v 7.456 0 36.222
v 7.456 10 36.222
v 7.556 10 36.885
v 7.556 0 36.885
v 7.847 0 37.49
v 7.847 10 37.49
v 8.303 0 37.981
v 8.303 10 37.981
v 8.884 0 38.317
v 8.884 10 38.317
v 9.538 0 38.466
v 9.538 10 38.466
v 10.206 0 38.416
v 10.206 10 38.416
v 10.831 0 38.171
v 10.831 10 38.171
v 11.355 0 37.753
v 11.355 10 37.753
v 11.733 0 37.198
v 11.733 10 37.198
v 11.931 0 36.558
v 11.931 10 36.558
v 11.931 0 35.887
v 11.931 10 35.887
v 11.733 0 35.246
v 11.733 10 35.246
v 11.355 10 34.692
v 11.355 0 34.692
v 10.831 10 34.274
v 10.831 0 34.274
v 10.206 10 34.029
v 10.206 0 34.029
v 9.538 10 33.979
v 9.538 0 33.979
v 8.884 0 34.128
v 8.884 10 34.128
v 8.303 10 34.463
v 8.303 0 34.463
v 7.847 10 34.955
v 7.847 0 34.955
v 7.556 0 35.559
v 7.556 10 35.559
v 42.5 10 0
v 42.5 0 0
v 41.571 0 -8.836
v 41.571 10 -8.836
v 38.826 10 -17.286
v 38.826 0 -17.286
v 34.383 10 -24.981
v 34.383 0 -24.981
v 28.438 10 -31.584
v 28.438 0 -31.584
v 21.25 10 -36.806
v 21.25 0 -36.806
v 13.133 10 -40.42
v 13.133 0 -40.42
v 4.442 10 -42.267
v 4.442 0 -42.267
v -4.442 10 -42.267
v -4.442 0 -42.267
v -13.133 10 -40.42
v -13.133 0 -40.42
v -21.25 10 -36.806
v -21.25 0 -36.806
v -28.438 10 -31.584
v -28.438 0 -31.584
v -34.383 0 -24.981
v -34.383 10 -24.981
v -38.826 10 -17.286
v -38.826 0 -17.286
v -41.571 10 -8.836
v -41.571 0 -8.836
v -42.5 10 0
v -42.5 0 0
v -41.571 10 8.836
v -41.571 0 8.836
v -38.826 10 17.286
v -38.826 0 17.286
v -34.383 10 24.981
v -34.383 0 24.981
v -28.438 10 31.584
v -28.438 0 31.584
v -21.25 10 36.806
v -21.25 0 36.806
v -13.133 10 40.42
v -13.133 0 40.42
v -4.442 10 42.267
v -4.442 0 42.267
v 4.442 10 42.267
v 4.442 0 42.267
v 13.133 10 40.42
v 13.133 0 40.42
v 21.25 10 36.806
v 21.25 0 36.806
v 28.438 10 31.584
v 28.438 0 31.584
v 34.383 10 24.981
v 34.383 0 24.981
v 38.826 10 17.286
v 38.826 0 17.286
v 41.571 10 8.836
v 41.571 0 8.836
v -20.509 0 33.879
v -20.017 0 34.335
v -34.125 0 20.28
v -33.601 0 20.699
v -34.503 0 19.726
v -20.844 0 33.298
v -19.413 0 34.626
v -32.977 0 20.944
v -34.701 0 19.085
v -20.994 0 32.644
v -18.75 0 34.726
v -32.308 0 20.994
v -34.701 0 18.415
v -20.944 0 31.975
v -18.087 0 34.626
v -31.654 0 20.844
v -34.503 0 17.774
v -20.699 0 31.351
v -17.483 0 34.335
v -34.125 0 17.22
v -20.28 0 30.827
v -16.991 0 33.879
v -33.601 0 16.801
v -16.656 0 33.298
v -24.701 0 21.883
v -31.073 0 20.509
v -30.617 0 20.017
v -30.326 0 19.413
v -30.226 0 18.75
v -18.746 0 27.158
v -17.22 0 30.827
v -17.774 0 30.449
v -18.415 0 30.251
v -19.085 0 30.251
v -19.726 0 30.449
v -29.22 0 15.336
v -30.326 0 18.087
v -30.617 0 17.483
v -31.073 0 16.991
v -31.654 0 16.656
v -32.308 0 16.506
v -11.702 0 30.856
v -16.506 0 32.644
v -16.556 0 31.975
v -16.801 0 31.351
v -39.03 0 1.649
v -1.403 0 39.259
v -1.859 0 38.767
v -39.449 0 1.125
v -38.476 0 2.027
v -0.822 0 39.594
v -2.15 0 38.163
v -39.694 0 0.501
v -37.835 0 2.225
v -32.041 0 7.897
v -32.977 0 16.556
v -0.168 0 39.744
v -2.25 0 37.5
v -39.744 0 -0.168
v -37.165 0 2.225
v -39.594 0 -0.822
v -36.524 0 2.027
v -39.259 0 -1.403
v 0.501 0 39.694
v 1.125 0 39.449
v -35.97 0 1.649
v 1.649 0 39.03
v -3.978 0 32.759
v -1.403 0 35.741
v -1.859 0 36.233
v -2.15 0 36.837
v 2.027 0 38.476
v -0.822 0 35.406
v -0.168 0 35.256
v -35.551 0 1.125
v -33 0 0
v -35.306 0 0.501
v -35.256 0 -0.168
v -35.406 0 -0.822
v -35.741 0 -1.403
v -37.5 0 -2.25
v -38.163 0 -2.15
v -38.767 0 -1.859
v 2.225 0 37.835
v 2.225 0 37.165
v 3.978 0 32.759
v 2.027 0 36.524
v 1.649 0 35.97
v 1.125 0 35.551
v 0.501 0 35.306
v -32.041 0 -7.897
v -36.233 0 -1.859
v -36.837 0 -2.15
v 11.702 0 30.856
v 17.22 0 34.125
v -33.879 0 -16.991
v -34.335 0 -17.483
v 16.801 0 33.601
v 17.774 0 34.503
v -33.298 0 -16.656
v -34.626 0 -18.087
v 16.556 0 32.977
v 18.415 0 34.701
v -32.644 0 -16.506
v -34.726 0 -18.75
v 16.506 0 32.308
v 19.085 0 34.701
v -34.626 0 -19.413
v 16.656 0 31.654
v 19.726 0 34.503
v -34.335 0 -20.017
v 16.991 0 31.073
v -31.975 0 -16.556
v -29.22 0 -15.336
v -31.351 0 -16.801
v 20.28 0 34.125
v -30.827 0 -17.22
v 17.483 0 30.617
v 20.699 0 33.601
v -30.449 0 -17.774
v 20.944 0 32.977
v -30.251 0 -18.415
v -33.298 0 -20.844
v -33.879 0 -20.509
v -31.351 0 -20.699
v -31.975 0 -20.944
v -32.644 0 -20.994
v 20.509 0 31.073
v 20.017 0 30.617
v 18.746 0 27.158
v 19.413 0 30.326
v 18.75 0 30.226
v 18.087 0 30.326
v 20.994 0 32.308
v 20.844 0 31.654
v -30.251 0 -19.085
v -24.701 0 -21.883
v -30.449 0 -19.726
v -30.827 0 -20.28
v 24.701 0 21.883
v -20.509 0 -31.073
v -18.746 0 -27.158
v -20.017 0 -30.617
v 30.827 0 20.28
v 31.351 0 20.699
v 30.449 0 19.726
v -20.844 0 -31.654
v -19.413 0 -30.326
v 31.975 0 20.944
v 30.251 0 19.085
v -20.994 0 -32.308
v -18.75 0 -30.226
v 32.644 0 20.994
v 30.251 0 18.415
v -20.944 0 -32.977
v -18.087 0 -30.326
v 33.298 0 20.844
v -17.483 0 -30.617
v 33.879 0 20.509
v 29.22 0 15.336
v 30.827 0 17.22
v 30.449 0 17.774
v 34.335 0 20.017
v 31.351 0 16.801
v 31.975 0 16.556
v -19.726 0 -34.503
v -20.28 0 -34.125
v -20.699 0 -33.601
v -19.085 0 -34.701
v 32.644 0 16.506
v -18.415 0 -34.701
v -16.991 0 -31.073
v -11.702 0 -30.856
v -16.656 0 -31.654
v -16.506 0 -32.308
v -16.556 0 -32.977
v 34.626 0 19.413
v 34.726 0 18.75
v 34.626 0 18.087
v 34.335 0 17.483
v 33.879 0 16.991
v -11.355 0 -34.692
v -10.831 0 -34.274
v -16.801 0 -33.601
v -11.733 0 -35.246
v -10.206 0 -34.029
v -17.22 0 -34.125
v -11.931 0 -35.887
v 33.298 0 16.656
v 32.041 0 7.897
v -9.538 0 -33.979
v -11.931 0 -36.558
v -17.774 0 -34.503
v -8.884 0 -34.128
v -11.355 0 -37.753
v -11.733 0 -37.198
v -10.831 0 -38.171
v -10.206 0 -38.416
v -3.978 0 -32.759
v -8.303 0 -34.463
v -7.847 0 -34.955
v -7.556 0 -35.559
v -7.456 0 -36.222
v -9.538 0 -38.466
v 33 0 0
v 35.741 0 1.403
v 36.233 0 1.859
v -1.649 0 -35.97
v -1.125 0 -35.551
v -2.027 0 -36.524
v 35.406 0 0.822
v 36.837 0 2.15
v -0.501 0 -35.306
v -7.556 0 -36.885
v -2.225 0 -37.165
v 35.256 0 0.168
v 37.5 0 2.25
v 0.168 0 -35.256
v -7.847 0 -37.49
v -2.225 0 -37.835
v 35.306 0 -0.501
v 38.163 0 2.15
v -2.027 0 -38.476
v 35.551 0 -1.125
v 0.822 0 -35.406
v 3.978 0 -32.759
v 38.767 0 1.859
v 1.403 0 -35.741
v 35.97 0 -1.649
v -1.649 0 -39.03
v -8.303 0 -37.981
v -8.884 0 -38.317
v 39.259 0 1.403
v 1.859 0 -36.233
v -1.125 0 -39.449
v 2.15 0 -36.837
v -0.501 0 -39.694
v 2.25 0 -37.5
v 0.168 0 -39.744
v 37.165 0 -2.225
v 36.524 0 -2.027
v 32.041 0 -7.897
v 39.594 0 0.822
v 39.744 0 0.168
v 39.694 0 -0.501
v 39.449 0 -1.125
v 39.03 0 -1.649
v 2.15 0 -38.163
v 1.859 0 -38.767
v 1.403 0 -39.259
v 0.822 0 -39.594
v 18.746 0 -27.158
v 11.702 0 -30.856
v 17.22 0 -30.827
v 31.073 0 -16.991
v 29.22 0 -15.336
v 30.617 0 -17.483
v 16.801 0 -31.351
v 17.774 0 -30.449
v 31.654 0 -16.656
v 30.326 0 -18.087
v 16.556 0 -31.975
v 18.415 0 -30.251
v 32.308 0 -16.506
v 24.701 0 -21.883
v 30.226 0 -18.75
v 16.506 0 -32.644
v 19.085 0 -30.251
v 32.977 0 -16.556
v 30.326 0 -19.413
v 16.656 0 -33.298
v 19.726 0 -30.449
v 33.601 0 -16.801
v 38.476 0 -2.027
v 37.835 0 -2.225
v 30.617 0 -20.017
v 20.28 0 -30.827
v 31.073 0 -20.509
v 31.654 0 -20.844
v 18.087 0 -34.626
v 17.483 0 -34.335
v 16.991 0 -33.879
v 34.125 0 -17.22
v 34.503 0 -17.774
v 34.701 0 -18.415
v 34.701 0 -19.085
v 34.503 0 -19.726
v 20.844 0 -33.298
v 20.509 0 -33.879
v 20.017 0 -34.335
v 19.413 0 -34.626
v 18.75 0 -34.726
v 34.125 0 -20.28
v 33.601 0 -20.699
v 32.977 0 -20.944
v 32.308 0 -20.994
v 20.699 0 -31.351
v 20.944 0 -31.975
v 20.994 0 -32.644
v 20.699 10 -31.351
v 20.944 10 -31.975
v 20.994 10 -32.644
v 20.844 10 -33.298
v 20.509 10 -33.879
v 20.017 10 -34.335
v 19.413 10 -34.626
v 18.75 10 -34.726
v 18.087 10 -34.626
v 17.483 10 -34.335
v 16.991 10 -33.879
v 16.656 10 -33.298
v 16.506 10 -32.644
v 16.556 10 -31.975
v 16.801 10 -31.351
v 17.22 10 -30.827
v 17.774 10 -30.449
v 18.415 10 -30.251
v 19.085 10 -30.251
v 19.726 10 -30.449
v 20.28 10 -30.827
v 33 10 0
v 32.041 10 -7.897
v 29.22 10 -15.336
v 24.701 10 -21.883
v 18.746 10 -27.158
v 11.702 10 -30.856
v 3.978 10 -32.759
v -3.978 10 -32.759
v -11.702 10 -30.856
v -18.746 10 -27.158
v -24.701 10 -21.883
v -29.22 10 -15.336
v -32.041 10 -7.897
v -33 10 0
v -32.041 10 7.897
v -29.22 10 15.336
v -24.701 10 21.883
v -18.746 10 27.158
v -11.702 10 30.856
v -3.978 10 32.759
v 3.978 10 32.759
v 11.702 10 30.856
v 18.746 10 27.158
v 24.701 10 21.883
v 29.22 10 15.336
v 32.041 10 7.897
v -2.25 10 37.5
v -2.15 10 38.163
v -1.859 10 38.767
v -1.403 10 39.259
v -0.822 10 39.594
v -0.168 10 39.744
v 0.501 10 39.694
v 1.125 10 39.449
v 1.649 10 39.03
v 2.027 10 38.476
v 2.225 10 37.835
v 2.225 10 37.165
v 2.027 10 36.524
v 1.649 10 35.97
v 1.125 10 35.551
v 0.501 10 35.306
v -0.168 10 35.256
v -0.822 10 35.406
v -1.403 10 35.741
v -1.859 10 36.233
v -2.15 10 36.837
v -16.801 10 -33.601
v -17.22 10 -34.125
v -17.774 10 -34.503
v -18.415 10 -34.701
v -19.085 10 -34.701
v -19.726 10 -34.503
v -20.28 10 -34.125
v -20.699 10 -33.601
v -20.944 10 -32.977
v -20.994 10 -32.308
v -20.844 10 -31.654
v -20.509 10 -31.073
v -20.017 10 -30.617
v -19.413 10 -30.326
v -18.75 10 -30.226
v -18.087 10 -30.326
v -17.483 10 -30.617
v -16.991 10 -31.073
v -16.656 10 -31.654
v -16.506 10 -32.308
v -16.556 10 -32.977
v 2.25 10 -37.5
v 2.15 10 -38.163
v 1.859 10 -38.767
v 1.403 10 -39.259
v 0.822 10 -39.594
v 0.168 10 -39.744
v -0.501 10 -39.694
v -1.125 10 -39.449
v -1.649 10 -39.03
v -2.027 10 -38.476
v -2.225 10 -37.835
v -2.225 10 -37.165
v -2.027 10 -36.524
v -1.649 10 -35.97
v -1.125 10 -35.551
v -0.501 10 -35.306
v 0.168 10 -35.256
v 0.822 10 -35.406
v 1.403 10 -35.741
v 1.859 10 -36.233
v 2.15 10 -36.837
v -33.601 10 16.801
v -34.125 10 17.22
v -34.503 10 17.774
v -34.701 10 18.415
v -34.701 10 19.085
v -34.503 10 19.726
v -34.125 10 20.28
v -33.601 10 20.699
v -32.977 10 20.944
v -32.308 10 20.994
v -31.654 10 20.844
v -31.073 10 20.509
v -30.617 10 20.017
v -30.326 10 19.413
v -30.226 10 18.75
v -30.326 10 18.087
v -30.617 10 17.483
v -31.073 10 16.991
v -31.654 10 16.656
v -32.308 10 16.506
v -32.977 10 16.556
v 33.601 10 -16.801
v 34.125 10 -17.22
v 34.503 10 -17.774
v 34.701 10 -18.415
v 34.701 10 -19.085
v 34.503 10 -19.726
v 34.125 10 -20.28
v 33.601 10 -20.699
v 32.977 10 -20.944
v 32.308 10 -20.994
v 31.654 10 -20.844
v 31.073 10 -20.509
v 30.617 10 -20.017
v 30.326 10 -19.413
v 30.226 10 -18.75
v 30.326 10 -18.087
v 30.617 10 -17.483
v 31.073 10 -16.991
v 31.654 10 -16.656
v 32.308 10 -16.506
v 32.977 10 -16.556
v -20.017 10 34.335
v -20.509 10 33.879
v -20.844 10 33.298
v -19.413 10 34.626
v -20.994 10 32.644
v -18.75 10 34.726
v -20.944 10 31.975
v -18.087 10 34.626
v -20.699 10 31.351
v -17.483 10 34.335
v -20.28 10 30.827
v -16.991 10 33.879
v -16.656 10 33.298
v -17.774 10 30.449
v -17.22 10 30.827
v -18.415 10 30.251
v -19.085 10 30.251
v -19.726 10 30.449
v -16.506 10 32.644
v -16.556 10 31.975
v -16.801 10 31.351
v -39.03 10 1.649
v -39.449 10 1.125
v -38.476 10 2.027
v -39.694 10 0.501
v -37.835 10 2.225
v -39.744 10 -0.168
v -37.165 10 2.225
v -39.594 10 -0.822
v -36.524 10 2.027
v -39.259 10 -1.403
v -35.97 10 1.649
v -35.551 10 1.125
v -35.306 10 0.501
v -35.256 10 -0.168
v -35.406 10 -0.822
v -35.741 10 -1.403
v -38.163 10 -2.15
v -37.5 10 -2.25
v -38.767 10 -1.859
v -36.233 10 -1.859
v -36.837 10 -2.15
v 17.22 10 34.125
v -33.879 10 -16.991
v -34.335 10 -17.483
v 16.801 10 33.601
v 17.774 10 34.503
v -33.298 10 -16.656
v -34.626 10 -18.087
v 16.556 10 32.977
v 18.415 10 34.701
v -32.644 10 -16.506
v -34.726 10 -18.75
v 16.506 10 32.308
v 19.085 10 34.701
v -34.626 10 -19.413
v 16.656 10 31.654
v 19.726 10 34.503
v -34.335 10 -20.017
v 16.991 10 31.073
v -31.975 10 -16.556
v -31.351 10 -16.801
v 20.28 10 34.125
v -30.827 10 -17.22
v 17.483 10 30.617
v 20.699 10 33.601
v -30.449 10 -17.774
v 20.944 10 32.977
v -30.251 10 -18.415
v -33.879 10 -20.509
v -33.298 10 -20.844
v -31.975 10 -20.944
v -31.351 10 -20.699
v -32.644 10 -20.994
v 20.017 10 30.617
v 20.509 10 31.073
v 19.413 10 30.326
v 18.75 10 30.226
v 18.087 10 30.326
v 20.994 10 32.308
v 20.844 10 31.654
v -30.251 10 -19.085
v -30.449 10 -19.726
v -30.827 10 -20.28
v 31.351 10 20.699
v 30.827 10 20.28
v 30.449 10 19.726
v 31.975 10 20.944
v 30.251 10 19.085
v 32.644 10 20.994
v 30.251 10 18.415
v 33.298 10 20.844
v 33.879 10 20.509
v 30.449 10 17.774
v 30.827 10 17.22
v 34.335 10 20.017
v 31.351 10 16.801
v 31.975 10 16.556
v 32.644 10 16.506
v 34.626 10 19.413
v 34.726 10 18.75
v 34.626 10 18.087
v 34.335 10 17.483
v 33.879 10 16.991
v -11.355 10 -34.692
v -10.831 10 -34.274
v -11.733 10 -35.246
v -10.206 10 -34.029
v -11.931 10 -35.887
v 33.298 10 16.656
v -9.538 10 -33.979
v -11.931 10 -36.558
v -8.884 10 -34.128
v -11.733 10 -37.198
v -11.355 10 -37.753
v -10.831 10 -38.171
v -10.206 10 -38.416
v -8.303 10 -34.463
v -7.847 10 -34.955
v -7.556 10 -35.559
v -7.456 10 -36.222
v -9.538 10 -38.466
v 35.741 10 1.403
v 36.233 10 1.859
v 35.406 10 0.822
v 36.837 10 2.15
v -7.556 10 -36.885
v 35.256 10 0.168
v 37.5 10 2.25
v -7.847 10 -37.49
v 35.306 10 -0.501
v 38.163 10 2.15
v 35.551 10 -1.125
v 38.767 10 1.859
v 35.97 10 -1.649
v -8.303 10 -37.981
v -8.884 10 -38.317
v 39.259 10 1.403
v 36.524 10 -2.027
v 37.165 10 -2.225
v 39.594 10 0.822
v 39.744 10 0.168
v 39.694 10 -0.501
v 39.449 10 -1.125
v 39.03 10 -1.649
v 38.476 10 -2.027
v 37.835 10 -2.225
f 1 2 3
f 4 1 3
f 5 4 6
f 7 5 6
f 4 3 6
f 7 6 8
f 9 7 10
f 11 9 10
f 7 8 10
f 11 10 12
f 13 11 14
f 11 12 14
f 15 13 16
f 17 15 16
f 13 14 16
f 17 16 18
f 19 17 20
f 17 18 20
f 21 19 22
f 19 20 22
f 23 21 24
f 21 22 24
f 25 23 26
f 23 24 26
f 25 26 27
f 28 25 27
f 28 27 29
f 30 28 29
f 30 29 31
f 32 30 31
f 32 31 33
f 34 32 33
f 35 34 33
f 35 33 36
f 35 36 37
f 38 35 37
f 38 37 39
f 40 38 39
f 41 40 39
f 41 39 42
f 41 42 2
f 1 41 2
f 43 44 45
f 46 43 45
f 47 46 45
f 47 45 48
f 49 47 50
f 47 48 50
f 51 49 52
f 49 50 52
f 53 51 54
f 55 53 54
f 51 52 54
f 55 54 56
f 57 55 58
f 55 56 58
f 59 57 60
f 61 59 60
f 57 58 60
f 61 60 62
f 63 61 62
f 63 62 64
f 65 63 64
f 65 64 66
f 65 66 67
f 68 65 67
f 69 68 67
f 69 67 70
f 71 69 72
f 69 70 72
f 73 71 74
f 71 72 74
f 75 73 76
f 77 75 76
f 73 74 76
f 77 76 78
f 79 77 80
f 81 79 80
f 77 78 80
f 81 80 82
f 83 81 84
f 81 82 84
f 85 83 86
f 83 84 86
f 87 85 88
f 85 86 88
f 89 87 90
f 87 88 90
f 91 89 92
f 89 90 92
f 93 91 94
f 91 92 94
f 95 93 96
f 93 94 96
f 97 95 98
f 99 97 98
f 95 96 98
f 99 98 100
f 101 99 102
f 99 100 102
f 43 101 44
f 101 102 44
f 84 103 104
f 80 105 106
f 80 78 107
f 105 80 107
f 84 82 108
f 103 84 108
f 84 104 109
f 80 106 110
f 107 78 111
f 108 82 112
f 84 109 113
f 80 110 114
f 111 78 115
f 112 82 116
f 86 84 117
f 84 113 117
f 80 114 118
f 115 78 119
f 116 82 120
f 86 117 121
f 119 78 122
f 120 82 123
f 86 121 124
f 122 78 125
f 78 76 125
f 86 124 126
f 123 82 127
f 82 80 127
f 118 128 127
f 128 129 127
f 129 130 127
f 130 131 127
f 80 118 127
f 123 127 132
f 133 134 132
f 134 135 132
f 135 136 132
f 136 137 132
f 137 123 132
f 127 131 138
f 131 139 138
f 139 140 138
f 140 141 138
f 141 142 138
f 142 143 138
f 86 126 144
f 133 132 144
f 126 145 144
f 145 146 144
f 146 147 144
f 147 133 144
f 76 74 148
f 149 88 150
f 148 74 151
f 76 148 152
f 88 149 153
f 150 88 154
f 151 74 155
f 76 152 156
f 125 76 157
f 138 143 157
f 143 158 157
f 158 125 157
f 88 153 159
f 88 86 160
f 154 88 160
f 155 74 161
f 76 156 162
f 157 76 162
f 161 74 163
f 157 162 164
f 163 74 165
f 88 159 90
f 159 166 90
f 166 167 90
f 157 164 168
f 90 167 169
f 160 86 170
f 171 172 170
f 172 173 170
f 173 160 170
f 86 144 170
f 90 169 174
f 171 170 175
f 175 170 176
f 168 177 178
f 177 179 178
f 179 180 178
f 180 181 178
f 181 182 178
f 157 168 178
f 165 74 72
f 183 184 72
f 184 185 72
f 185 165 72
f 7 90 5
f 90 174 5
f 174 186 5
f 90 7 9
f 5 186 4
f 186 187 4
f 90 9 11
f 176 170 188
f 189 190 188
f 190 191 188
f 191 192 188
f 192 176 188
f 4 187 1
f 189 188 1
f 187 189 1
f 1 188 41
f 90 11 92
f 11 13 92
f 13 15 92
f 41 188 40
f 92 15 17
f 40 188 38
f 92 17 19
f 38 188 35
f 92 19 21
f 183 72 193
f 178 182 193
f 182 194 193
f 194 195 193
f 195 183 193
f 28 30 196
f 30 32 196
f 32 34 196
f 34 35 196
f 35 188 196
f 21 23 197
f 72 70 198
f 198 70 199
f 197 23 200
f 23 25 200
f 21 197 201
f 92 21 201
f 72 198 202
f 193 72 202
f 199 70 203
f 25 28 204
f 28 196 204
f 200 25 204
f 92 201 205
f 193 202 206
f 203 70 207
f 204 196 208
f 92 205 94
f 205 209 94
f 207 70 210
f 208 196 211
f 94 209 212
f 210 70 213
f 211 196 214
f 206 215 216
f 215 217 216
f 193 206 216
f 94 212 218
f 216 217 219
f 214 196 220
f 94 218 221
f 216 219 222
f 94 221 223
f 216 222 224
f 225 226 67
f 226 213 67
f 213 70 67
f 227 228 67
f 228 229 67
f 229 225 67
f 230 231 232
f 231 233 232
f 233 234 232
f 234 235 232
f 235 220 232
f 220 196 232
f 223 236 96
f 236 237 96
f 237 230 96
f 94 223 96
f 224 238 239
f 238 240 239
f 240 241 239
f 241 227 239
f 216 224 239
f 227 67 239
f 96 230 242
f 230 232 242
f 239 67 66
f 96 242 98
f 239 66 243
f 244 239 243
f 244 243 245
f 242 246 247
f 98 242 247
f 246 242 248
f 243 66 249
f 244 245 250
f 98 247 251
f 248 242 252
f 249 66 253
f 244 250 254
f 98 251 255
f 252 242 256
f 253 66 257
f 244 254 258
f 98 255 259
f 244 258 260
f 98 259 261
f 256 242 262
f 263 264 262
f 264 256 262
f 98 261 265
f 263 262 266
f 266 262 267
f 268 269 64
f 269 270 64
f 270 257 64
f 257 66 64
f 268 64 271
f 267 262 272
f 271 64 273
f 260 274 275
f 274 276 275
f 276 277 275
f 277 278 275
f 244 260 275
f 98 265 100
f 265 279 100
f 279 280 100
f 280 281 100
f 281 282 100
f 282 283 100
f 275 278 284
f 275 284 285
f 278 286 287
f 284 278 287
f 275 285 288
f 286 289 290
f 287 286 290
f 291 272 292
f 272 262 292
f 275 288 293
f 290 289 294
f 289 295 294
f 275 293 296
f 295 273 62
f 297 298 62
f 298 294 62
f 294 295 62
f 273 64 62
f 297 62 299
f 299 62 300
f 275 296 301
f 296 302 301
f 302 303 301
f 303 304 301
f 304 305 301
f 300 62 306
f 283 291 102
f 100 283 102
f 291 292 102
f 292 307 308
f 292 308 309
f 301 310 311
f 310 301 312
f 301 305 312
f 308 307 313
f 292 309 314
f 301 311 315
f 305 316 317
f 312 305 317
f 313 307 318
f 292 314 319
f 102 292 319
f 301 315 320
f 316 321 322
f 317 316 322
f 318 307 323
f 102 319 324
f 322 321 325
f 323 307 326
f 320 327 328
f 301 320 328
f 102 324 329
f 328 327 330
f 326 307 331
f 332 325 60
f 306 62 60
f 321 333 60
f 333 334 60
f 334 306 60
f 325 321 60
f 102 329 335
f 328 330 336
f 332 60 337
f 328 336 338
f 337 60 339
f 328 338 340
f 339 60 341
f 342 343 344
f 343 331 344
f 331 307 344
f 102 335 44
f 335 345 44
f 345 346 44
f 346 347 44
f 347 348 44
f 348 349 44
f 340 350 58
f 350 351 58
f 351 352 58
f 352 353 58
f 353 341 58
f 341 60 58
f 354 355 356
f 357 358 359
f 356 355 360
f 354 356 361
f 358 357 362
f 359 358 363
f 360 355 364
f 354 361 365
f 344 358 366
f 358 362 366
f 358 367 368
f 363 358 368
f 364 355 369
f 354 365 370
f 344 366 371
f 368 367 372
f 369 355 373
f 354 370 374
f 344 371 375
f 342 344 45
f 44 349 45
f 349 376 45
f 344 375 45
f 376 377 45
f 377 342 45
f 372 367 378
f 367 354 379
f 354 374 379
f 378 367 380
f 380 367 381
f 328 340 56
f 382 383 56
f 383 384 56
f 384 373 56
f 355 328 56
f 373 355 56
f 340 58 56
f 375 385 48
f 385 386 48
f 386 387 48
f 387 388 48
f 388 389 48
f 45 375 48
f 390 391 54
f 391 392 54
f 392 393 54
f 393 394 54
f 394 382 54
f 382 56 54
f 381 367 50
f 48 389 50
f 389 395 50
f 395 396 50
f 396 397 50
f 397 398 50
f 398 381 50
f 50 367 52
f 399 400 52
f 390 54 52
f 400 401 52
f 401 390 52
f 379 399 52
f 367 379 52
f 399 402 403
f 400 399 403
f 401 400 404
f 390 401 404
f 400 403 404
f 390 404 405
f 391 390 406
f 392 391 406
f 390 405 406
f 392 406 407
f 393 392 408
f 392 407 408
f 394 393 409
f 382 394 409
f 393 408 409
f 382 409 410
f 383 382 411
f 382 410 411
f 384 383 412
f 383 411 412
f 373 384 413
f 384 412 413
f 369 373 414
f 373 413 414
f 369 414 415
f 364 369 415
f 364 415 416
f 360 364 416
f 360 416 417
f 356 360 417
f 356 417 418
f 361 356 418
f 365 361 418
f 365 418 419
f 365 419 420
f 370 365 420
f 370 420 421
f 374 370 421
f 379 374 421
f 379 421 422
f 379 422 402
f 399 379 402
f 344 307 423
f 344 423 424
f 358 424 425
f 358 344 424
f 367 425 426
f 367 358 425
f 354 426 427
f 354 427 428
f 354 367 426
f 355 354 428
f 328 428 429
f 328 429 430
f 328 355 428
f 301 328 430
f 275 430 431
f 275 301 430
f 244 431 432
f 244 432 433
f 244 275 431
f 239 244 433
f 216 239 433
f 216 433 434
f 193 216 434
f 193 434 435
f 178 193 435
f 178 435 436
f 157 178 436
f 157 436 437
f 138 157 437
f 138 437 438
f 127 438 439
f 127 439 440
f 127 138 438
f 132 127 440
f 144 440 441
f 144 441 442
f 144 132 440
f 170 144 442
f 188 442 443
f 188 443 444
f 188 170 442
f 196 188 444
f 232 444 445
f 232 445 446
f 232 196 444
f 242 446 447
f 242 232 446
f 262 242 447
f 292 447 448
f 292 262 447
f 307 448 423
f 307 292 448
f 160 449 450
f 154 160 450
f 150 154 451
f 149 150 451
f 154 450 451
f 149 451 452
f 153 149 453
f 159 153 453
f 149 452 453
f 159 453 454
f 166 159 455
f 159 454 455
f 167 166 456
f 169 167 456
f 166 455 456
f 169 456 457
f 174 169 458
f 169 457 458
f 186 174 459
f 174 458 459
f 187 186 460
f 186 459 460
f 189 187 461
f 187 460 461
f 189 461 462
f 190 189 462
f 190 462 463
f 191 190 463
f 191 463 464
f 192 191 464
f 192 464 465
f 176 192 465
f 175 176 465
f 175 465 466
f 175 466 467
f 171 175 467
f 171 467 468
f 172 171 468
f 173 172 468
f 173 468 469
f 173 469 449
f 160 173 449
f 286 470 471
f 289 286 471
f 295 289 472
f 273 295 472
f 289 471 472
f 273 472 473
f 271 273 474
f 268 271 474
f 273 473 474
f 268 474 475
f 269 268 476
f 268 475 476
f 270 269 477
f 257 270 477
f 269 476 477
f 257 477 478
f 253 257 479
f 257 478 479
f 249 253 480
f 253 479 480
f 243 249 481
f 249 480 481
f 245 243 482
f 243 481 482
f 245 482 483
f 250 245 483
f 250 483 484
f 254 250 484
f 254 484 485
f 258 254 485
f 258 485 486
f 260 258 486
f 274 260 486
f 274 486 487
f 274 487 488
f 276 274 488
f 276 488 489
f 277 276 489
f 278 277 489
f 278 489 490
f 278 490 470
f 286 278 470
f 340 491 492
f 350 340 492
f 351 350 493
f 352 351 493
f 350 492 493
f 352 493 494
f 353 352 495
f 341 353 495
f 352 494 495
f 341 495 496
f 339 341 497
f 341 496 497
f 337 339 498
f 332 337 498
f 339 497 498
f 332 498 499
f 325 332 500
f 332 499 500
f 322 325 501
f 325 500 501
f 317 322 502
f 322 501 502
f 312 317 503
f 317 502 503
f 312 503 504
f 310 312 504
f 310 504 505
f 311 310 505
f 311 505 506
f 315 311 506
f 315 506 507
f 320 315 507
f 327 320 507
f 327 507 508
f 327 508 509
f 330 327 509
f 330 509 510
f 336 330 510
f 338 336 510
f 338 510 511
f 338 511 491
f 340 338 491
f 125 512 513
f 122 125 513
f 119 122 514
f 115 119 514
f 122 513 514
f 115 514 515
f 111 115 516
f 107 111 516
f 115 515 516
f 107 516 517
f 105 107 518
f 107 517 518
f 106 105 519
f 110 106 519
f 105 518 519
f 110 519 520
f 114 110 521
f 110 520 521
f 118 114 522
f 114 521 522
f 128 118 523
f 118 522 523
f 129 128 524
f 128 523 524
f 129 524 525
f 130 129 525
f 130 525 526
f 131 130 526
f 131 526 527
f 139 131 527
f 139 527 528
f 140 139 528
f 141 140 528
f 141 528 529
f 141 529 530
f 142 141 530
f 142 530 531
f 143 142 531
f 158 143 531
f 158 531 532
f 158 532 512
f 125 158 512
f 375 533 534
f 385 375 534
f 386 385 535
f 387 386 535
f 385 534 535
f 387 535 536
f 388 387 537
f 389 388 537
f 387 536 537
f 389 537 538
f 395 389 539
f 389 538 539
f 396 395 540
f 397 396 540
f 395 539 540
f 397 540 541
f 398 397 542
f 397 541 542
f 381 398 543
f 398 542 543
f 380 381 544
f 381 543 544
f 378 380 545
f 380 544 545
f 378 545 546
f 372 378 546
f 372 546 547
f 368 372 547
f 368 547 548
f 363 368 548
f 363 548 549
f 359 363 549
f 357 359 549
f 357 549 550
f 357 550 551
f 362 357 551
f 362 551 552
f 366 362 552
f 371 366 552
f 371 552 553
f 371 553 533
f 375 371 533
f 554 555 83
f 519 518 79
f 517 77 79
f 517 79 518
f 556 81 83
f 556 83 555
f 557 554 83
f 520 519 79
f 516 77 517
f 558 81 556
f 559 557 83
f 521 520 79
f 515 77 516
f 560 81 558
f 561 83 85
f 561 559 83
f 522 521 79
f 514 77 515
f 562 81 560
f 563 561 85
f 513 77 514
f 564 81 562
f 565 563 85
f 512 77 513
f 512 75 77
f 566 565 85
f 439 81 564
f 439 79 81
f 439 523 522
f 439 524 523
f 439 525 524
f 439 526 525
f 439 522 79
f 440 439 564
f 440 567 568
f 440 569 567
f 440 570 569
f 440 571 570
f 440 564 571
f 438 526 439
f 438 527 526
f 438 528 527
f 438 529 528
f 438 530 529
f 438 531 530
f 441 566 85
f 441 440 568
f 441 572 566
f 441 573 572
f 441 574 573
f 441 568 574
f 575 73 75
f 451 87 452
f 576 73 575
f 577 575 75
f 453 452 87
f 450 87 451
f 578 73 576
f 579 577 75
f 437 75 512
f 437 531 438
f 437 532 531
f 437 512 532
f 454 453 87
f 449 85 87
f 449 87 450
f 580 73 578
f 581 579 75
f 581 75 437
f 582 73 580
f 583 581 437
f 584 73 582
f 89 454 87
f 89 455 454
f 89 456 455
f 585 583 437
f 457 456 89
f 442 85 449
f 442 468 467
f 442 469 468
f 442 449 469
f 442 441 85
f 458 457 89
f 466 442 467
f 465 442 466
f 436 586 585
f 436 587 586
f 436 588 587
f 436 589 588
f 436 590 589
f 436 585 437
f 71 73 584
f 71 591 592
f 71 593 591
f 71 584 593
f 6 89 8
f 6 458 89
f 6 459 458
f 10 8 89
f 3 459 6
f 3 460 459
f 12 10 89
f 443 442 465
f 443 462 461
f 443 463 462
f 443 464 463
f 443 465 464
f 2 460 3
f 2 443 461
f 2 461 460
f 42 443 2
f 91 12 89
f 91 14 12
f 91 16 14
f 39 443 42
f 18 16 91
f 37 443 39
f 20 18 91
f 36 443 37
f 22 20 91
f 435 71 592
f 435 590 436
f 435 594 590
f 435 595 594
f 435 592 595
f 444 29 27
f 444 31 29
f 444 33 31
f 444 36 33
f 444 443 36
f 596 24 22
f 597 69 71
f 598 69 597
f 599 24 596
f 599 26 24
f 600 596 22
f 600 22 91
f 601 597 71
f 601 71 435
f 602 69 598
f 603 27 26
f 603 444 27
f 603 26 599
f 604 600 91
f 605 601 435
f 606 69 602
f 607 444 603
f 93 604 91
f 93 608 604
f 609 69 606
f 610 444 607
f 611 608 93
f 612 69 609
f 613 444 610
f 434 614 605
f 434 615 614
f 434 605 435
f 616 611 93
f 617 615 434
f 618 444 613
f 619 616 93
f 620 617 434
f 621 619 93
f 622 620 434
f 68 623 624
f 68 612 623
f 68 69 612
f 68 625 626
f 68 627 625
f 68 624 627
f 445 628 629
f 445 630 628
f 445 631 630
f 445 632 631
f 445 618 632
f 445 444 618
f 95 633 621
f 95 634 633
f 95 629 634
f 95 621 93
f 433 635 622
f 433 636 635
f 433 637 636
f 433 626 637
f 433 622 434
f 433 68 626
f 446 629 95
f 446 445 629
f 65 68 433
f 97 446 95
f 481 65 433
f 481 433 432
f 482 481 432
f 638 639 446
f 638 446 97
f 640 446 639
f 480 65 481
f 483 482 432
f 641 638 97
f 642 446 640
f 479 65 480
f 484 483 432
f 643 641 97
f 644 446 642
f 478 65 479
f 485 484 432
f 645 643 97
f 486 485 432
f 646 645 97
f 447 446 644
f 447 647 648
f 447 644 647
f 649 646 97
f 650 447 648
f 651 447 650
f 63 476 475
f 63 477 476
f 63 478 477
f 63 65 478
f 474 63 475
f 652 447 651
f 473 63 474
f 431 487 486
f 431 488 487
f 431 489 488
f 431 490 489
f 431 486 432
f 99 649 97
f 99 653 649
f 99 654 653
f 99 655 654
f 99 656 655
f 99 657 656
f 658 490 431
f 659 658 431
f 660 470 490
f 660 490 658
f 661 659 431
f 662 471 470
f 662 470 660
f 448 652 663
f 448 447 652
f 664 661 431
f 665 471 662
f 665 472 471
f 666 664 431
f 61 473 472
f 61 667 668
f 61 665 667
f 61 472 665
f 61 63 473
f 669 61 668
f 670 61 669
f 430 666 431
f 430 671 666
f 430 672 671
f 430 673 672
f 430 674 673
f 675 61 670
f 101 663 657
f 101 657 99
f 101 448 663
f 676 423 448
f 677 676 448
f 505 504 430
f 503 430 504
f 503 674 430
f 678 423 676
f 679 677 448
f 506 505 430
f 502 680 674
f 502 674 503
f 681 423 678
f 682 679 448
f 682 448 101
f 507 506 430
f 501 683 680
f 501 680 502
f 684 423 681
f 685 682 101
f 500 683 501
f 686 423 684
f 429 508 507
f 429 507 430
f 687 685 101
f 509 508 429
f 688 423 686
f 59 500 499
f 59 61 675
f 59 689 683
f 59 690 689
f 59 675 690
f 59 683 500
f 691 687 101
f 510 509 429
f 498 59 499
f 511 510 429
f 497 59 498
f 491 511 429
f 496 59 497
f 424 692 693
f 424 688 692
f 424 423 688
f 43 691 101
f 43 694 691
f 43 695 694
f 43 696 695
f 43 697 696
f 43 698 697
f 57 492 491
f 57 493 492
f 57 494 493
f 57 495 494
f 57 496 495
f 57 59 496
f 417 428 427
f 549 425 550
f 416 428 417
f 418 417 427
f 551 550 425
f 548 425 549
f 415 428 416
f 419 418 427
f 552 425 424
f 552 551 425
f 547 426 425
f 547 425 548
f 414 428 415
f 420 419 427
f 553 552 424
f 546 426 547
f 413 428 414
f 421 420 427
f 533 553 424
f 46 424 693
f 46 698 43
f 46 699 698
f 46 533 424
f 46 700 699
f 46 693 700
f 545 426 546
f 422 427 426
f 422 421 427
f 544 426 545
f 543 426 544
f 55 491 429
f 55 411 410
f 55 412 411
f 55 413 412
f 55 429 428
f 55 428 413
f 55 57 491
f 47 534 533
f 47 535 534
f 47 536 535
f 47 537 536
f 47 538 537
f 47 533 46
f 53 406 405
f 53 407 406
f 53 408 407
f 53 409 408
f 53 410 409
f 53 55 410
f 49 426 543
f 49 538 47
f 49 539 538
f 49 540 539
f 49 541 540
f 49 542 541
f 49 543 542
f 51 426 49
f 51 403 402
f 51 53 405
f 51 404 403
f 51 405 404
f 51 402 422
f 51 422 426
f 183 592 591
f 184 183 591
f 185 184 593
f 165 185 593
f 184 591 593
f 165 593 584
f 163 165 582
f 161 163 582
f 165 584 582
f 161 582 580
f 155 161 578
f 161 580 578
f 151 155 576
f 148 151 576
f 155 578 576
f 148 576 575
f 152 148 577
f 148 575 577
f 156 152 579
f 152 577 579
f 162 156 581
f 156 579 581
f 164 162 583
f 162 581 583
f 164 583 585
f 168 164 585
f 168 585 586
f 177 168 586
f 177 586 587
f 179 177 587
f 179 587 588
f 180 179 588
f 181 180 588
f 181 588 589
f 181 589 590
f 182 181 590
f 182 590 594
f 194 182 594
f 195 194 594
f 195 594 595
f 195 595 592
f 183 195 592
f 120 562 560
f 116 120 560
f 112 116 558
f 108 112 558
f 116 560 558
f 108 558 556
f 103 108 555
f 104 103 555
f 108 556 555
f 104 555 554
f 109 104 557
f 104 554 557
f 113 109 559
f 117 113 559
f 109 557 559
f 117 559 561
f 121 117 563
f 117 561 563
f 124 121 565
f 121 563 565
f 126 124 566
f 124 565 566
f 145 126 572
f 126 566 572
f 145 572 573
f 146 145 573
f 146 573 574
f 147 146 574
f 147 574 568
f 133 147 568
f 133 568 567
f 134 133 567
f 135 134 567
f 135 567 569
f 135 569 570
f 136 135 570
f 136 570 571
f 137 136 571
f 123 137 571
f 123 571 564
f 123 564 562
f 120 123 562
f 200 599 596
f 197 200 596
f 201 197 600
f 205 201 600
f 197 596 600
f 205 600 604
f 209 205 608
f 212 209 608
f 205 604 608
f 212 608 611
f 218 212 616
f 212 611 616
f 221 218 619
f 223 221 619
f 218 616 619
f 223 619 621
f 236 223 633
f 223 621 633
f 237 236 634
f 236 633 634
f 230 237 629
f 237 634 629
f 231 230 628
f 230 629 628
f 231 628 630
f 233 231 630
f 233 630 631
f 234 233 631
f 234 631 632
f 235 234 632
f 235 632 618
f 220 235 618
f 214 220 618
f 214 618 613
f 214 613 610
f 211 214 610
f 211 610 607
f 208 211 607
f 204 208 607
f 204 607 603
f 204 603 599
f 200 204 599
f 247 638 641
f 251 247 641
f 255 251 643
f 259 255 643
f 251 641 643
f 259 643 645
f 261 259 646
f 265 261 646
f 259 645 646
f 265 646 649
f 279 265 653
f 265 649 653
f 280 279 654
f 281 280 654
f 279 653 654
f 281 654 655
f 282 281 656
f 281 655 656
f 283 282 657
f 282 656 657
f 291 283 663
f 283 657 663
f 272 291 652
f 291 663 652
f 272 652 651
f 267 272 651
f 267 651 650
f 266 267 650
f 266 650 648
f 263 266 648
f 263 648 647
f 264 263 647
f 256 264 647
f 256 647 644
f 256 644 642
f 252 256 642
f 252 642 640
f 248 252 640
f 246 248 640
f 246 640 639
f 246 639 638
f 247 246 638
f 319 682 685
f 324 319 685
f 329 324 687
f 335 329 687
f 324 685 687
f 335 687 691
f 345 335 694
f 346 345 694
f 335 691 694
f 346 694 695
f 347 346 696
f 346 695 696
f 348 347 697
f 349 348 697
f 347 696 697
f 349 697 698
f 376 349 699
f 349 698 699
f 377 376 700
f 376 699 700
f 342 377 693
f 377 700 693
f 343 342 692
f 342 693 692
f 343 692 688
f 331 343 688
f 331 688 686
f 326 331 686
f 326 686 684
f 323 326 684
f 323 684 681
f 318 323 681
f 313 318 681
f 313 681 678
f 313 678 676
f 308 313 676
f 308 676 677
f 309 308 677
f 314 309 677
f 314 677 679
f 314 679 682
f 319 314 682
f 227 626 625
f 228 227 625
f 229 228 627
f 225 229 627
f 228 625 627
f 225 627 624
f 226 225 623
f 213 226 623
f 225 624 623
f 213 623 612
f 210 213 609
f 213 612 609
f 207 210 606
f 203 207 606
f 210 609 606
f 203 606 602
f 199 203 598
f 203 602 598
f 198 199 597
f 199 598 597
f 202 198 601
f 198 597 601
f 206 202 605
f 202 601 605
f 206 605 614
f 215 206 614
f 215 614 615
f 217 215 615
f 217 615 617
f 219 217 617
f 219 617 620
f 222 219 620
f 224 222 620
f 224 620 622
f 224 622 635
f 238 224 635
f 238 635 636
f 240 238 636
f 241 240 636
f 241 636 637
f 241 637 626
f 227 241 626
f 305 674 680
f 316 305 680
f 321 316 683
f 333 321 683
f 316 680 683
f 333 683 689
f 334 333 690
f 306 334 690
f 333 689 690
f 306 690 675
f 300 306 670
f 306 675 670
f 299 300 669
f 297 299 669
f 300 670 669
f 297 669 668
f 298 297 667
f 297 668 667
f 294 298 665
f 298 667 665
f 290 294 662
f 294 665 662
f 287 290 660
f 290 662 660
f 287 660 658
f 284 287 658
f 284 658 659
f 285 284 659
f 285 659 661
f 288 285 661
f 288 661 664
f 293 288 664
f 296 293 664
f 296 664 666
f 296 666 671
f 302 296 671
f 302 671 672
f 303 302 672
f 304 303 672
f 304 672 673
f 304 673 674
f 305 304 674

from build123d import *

# Parameters (mm, degrees)
SKETCH1_R           = 42.5
SKETCH1_R_2         = 33
BOSS_EXTRUDE1_DEPTH = 10
SKETCH2_R           = 2.25
CUT_EXTRUDE1_DEPTH  = 11
CIRPATTERN1_COUNT   = 12
SKETCH3_R           = 2.25
CUT_EXTRUDE2_DEPTH  = 11
CIRPATTERN2_COUNT   = 2


with BuildPart() as part:
    # Sketch1 → Boss-Extrude1 (new body)
    with BuildSketch(Plane(origin=(0, 0, 0), x_dir=(1, 0, 0), z_dir=(0, 1, 0))):
        Circle(SKETCH1_R)
        Circle(SKETCH1_R_2, mode=Mode.SUBTRACT)
    extrude(amount=BOSS_EXTRUDE1_DEPTH)

    # Sketch2 → Cut-Extrude1 (cut, through all)
    with BuildSketch(Plane(origin=(0, 10, 0), x_dir=(1, 0, 0), z_dir=(0, 1, 0))):
        with Locations((0, 37.5)):
            Circle(SKETCH2_R)
    cut_extrude1 = extrude(amount=-CUT_EXTRUDE1_DEPTH, mode=Mode.SUBTRACT)

    # CirPattern1: Cut-Extrude1 ×12 about axis
    cirpattern1_axis = Axis((0, 0, 0), (0, 1, 0))
    for i in range(1, CIRPATTERN1_COUNT):
        add(cut_extrude1.rotate(cirpattern1_axis, i * 360 / CIRPATTERN1_COUNT), mode=Mode.SUBTRACT)

    # Sketch3 → Cut-Extrude2 (cut, through all)
    with BuildSketch(Plane(origin=(0, 10, 0), x_dir=(1, 0, 0), z_dir=(0, 1, 0))):
        with Locations((-9.705714191, 36.222218486)):
            Circle(SKETCH3_R)
    cut_extrude2 = extrude(amount=-CUT_EXTRUDE2_DEPTH, mode=Mode.SUBTRACT)

    # CirPattern2: Cut-Extrude2 ×2 about axis
    cirpattern2_axis = Axis((0, 0, 0), (0, 1, 0))
    for i in range(1, CIRPATTERN2_COUNT):
        add(cut_extrude2.rotate(cirpattern2_axis, i * 360 / CIRPATTERN2_COUNT), mode=Mode.SUBTRACT)


solid = part.part
